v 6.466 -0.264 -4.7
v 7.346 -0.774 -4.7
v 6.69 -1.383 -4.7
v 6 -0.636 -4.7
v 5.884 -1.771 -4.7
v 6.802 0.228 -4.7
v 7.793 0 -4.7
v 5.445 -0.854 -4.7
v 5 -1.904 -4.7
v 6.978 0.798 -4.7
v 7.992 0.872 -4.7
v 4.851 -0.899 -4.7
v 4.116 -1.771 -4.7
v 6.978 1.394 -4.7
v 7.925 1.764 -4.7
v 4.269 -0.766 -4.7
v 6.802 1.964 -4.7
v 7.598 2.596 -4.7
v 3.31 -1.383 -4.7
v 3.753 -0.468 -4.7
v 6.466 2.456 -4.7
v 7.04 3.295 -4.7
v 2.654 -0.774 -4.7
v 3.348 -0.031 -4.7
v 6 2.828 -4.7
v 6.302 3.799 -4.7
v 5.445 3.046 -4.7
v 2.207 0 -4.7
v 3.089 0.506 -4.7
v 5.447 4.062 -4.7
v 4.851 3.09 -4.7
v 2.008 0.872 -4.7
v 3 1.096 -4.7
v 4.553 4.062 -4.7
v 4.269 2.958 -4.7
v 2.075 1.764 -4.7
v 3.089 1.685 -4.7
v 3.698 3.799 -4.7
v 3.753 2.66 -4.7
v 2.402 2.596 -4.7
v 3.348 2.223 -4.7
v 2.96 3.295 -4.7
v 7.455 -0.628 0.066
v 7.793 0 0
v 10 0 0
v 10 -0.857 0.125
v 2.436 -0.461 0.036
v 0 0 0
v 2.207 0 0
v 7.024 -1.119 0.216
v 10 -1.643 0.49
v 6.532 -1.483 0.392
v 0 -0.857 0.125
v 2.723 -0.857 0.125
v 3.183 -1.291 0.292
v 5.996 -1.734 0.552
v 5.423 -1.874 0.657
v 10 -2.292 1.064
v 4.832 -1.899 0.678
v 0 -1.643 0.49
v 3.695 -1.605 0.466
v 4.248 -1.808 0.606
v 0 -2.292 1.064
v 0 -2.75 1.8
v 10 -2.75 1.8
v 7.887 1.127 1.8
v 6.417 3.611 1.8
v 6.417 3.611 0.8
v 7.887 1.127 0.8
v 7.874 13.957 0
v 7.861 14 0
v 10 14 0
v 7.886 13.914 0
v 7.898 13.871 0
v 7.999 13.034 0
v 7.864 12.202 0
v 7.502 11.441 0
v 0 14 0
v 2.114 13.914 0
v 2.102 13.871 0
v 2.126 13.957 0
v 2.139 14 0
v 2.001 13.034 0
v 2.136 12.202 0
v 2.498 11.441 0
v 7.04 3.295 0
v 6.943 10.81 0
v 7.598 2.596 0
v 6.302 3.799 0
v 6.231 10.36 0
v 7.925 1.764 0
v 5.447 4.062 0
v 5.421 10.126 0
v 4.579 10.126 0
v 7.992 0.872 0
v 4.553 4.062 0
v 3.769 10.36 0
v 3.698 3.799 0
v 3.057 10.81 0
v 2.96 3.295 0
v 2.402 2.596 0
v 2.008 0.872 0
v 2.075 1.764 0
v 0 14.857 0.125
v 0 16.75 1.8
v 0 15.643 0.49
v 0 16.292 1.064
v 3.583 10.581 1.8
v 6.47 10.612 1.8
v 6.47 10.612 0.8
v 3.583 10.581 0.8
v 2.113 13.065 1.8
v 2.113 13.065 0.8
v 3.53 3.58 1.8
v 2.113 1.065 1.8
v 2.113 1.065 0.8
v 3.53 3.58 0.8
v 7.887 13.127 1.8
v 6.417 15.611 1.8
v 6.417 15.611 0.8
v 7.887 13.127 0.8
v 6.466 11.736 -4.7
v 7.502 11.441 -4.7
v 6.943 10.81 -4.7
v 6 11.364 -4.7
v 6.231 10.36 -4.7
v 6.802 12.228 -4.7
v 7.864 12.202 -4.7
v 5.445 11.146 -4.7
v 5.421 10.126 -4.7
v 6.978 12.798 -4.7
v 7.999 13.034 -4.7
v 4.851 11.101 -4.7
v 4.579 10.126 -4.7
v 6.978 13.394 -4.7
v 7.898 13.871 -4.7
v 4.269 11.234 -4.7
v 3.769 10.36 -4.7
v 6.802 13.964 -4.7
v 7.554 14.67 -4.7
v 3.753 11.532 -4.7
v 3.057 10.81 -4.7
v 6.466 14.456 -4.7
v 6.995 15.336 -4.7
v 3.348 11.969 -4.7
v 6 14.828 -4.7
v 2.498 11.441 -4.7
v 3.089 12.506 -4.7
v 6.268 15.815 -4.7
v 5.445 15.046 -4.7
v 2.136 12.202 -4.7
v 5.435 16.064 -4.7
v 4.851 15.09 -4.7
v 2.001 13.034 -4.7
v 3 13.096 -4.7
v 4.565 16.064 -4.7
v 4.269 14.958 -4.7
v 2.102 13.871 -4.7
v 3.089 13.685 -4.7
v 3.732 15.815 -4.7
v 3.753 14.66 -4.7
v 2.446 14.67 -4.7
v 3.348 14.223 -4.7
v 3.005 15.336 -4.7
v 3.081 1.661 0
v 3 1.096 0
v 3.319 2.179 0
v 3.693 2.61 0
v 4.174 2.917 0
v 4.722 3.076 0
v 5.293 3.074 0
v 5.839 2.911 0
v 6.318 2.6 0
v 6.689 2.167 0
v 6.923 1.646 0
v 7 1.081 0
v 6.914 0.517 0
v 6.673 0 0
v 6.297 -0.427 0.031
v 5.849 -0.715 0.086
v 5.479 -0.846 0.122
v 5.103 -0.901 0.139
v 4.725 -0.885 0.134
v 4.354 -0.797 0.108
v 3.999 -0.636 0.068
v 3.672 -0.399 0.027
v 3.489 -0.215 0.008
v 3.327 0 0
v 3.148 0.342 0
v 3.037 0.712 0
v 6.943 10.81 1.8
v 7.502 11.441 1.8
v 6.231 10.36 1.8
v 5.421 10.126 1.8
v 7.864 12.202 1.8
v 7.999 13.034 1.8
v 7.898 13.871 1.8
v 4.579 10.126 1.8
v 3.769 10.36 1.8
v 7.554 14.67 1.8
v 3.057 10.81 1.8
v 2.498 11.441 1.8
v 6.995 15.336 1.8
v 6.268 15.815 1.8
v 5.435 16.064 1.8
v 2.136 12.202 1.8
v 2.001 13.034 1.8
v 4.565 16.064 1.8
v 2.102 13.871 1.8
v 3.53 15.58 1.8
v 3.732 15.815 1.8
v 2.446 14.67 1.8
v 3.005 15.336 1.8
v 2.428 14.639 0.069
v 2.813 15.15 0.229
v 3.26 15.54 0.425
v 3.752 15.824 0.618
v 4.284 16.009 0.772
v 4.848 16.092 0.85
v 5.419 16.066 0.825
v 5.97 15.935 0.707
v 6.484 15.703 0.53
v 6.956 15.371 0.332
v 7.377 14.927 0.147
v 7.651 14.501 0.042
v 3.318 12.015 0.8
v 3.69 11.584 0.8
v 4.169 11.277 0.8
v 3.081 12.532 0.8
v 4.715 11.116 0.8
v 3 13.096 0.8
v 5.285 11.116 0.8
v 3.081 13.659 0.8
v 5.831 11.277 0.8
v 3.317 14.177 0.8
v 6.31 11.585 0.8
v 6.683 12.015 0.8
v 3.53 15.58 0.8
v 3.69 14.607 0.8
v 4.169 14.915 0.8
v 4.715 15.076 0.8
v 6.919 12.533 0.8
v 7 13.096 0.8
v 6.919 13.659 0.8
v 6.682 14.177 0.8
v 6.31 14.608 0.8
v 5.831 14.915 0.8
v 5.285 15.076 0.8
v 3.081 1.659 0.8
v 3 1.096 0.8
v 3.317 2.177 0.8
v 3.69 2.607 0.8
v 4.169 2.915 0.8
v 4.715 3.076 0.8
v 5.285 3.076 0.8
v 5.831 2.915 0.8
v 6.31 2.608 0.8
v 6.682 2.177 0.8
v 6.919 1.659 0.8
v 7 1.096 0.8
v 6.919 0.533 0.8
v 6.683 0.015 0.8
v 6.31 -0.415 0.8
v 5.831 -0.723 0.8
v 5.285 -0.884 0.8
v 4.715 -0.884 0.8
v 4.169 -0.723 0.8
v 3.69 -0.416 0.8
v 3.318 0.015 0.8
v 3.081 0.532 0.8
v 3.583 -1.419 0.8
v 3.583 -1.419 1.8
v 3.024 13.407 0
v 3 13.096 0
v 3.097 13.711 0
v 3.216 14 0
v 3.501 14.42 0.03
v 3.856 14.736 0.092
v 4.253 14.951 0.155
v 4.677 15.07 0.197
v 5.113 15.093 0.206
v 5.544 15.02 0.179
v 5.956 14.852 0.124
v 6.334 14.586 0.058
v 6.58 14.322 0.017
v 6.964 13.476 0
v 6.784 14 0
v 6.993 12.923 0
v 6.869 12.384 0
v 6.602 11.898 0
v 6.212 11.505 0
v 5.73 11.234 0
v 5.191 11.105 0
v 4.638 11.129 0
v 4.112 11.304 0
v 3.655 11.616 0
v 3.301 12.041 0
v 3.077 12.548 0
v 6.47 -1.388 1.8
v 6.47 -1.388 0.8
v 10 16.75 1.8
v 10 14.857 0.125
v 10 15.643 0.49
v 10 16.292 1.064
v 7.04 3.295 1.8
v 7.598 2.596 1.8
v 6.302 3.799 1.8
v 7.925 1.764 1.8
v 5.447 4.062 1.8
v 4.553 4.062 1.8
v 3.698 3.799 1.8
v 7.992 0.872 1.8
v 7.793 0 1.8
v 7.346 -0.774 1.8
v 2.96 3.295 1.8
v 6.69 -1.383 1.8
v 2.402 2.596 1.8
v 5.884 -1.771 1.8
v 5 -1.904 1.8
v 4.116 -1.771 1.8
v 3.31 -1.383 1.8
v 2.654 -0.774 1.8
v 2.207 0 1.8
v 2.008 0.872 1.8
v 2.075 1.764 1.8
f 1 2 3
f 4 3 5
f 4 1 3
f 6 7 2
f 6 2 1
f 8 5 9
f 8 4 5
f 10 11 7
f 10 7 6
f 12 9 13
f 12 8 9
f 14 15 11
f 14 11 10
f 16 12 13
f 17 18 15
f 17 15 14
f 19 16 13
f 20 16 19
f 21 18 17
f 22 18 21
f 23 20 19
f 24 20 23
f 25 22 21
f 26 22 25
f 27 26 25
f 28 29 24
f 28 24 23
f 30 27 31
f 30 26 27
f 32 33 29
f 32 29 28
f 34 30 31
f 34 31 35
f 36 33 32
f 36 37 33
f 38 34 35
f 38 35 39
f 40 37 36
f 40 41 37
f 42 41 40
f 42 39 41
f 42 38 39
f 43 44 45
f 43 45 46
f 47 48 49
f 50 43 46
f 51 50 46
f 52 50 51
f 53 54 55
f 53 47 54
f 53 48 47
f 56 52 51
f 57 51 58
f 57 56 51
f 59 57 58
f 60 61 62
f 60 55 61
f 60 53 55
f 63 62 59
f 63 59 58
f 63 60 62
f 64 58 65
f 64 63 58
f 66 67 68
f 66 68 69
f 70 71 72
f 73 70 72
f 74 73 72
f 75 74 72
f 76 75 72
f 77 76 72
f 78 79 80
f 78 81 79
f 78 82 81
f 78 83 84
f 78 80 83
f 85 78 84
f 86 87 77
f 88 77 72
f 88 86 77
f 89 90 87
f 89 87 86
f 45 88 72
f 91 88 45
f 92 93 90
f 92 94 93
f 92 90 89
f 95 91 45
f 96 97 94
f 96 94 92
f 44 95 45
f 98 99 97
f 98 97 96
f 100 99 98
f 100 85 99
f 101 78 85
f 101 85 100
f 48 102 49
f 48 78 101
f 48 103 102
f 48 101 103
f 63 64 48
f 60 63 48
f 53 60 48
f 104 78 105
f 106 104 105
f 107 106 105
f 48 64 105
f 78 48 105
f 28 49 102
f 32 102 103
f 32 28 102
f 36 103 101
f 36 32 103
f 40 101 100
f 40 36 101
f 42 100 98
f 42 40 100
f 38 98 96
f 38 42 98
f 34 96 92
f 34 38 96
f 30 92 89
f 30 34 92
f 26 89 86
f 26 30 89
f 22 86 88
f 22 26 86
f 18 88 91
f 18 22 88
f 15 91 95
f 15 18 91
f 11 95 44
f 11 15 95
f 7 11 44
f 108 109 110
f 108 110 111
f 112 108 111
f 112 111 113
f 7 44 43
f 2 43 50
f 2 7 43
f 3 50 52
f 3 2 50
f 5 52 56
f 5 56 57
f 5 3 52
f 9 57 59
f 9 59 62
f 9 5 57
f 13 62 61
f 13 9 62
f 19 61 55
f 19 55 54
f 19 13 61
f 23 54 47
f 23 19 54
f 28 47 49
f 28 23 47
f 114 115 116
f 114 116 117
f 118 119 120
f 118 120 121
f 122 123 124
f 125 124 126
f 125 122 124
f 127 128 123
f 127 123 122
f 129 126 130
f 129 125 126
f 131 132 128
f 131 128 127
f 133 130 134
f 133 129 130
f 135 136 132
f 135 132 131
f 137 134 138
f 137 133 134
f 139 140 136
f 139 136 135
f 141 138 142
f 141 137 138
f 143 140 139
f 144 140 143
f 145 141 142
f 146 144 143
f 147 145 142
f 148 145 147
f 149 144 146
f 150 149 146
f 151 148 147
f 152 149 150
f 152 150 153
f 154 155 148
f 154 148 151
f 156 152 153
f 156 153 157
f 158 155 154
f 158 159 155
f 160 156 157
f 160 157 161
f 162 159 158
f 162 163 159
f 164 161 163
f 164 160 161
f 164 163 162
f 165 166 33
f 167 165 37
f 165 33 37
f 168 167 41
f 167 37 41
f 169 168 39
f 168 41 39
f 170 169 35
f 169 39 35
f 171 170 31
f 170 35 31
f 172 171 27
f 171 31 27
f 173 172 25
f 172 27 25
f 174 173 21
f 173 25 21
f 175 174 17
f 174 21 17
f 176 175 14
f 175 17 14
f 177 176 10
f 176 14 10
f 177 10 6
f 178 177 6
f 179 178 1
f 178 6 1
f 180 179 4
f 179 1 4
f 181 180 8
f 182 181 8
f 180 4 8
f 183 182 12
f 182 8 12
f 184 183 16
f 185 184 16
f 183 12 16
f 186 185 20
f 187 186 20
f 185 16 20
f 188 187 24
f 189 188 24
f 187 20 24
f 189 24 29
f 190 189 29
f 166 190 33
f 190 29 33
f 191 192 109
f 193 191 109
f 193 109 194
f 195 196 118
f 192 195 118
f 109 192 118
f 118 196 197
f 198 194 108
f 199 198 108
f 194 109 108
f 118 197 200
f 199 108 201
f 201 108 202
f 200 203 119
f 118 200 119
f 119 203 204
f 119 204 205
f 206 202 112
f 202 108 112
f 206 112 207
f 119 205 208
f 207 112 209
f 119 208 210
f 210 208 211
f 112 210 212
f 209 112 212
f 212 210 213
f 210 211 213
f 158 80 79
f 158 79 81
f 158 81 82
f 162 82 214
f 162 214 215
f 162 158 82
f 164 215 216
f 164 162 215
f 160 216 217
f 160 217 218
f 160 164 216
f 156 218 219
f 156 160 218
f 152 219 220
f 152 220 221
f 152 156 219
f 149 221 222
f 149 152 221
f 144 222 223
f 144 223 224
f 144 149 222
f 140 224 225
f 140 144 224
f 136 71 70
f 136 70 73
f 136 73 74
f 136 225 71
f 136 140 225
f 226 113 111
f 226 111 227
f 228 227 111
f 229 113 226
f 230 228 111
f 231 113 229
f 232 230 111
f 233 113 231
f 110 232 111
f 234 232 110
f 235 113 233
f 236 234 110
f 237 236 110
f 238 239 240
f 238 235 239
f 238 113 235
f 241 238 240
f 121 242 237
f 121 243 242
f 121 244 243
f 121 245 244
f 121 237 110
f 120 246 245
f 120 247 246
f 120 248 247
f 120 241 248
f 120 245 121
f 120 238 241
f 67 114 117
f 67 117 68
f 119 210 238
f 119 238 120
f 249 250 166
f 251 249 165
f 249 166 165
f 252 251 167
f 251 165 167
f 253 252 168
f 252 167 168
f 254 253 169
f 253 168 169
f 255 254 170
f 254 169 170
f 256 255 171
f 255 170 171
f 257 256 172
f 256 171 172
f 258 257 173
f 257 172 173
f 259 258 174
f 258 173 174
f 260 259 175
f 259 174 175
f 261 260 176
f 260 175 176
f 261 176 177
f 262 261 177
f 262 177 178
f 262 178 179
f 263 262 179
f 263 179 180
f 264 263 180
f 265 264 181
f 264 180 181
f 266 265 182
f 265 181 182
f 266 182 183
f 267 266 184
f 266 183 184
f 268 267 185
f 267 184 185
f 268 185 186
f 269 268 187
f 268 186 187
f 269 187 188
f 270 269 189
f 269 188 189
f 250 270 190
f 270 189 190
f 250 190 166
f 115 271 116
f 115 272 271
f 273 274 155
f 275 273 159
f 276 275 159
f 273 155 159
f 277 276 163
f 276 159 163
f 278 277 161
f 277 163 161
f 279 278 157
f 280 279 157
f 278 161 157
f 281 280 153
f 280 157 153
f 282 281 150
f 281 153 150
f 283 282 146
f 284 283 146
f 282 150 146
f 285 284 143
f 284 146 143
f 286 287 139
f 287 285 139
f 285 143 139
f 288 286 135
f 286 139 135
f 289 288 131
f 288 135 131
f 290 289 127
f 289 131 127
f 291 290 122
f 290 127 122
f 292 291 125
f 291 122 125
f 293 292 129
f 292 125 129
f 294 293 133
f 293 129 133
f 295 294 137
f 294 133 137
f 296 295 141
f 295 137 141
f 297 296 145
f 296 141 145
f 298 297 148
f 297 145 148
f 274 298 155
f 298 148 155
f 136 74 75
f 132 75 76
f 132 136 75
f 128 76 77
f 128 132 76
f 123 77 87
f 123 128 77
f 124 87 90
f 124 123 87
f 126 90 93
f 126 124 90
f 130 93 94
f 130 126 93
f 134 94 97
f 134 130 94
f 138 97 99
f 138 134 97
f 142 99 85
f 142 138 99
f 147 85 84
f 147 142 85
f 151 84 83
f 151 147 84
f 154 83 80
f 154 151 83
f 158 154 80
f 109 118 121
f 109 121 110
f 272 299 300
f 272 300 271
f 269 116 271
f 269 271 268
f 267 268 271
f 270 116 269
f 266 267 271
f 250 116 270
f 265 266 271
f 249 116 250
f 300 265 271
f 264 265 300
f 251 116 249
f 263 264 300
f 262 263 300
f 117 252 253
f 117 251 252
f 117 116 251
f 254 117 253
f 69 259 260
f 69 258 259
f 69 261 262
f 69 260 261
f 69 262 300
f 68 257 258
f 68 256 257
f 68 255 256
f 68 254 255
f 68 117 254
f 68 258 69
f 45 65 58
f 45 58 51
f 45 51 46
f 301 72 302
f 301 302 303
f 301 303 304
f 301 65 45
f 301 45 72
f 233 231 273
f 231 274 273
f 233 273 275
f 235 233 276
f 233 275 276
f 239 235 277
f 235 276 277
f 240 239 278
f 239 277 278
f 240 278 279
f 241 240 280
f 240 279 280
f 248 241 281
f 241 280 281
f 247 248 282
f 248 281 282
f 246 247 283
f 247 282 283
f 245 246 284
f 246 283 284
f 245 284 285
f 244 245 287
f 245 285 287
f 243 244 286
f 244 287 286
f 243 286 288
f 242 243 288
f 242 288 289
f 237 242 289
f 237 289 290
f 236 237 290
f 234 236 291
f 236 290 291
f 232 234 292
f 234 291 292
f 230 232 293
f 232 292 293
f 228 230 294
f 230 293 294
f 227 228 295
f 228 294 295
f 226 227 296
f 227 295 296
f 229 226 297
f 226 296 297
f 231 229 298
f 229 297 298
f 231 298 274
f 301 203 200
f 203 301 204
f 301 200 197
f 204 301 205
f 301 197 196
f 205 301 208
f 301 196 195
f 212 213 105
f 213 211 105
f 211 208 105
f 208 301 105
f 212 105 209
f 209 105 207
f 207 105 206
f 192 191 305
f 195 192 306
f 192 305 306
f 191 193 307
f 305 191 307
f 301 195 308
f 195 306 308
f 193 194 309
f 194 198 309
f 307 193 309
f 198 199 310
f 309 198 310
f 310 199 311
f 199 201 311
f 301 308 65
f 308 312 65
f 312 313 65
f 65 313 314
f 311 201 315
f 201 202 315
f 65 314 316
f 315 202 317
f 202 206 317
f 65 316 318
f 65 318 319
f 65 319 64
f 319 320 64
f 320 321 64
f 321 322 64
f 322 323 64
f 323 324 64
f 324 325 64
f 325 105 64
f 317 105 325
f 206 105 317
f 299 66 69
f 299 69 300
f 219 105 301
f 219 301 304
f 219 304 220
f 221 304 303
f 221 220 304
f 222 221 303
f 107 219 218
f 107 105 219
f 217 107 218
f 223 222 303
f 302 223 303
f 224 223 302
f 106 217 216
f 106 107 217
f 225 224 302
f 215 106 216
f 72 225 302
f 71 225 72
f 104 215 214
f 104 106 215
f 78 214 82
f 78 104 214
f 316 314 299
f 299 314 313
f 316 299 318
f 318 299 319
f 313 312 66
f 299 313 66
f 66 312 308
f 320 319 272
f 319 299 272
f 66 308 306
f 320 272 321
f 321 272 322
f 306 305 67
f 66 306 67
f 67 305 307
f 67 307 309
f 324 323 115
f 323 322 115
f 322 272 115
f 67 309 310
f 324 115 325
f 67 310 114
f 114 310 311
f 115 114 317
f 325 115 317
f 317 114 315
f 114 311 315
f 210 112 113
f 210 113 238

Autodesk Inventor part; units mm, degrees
ref_plane "XZ Plane" through (0, 0, 0) normal (0, 1, 0) x (-1, 0, 0)
ref_plane "XY Plane" through (0, 0, 0) normal (0, 0, 1) x (1, 0, 0)
ref_plane "Arbeitsebene1" through (5, 7.0959, 0) normal (1, 0, 0) x (0, 1, 0)
sketch "Skizze1" plane through (5, 7.0959, 0) normal (1, 0, 0) x (0, 1, 0)
  arc A0 (6.9041, 0) -> (9.9041, 3) centre (6.9041, 3) ccw projected
  line L0 (6.9041, 0) -> (-7.0959, 0) projected
  arc A1 (-10.0959, 3) -> (-7.0959, 0) centre (-7.0959, 3) ccw projected
  line L1 (9.6536, 1.8) -> (-9.8455, 1.8)
  dimension "d0" = 1.8
extrude "Extrusion1" add sketch "Skizze1" along normal mid plane 10
ref_plane "Arbeitsebene2" through (5, -12.9041, -4.7) normal (0, 0, -1) x (-1, 0, 0)
sketch "Skizze2" plane through (5, -12.9041, -4.7) normal (0, 0, -1) x (-1, 0, 0)
  arc A0 (-2.8982, 26.7749) -> (2.8982, 26.7749) centre (0, 26) ccw projected
  arc A1 (2.7927, 12.9041) -> (-2.7927, 12.9041) centre (0, 14) ccw projected
  circle A2 centre (0, 14) radius 3
  circle A3 centre (0, 26) radius 3
  circle A4 centre (0, 26) radius 2
  circle A5 centre (0, 14) radius 2
  point P0 (5, 12.9041)
  dimension "d3" = 0
  dimension "d4" = 4
extrude "Extrusion2" add sketch "Skizze2" against normal up to surface (6.5 mm away)
sketch "Skizze3" plane through (5, 13.0959, -4.7) normal (0, 0, -1) x (-1, 0, 0)
  circle A0 centre (0, 0) radius 2 projected
  circle A1 centre (0, -12) radius 2 projected
  point P0 (5, -13.0959)
extrude "Extrusion3" cut sketch "Skizze3" against normal up to surface (6.5 mm away)
sketch "Skizze4" plane through (0, -2.7495, 1.8) normal (0, 0, 1) x (1, 0, 0)
  circle A0 centre (5, 15.8455) radius 2 projected
  circle A1 centre (5, 3.8455) radius 2 projected
  line L0 (0, 0) -> (10, 0) projected
  line L1 (10, 19.4991) -> (10, 0) projected
  line L2 (0, 19.4991) -> (10, 19.4991) projected
  line L3 (0, 0) -> (0, 19.4991) projected
  circle A2 centre (5, 15.8455) radius 2 projected
  line L4 (7.8866, 15.8762) -> (6.4699, 13.361)
  line L5 (6.4699, 13.361) -> (3.5833, 13.3303)
  line L6 (3.5833, 13.3303) -> (2.1134, 15.8148)
  line L7 (2.1134, 15.8148) -> (3.5301, 18.33)
  line L8 (3.5301, 18.33) -> (6.4167, 18.3607)
  line L9 (6.4167, 18.3607) -> (7.8866, 15.8762)
  line L10 (7.8866, 3.8762) -> (6.4699, 1.361)
  line L11 (6.4699, 1.361) -> (3.5833, 1.3303)
  line L12 (3.5833, 1.3303) -> (2.1134, 3.8148)
  line L13 (2.1134, 3.8148) -> (3.5301, 6.33)
  line L14 (3.5301, 6.33) -> (6.4167, 6.3607)
  line L15 (6.4167, 6.3607) -> (7.8866, 3.8762)
  point P0 (0, 2.7495)
  dimension "d9" = 5
extrude "Extrusion4" cut sketch "Skizze4" against normal blind 1 contours L4 L5 L6 L7 L8 L9 | L10 L11 L12 L13 L14 L15
properties part number "Isolationsmasse"
